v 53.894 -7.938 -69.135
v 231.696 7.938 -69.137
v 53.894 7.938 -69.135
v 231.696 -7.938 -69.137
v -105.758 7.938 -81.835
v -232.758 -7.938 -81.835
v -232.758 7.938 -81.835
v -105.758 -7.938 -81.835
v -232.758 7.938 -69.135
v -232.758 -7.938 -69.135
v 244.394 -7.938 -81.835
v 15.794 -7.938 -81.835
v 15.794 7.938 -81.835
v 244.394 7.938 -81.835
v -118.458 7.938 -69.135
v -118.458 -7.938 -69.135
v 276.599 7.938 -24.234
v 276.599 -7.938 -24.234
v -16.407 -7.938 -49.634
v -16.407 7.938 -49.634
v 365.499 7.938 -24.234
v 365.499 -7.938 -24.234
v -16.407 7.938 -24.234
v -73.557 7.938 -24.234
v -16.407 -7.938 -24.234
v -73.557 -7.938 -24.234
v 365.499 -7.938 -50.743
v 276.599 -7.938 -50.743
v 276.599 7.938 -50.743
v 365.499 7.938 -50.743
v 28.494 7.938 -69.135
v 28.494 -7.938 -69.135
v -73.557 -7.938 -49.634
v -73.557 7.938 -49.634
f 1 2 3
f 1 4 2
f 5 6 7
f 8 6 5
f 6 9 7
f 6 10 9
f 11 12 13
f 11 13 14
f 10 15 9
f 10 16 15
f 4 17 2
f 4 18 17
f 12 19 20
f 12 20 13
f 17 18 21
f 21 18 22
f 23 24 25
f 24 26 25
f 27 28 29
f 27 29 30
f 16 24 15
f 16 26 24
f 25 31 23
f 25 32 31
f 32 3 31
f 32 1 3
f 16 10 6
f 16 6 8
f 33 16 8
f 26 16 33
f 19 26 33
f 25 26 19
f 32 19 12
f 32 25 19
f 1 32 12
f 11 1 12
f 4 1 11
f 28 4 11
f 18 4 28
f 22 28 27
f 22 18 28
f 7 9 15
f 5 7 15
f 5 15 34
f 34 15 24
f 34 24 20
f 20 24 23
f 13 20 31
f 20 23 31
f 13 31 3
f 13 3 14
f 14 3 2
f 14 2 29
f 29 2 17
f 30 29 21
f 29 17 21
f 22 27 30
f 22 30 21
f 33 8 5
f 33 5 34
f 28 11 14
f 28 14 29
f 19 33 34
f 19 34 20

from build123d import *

# Parameters (mm, degrees)
F1_DEPTH = 7.9375
F2_DEPTH = 7.9375
F0_W     = 57.15
F0_H     = 25.4
F3_DEPTH = 7.9375
F4_DEPTH = 7.9375
F5_DEPTH = 7.9375
F6_DEPTH = 7.9375
F0_W_2   = 88.9
F0_H_2   = 26.509378
F7_DEPTH = 7.9375


with BuildPart() as f1:
    # F0 (on Front) → F1 (new body, symmetric)
    with BuildSketch(Plane.XZ):
        Polygon((-232.758469, -69.13498), (-232.758469, -81.83498), (-105.758469, -81.83498), (-118.458469, -69.13498), align=None)
    extrude(amount=F1_DEPTH, both=True)

    # F0 (on Front) → F2 (join, symmetric)
    with BuildSketch(Plane.XZ):
        Polygon((-118.458469, -69.13498), (-105.758469, -81.83498), (-73.557188, -49.6337), (-73.557188, -24.2337), align=None)
    extrude(amount=F2_DEPTH, both=True)

    # F0 (on Front) → F3 (join, symmetric)
    with BuildSketch(Plane.XZ):
        with Locations((-44.982188, -36.9337)):
            Rectangle(F0_W, F0_H)
    extrude(amount=F3_DEPTH, both=True)

    # F0 (on Front) → F4 (join, symmetric)
    with BuildSketch(Plane.XZ):
        Polygon((-16.407188, -24.2337), (-16.407188, -49.6337), (15.794092, -81.83498), (28.494092, -69.13498), align=None)
    extrude(amount=F4_DEPTH, both=True)

    # F0 (on Front) → F5 (join, symmetric)
    with BuildSketch(Plane.XZ):
        Polygon((28.494092, -69.13498), (15.794092, -81.83498), (53.894092, -81.83498), (244.394092, -81.83498), (231.69601, -69.136898), (53.894092, -69.13498), align=None)
    extrude(amount=F5_DEPTH, both=True)

    # F0 (on Front) → F6 (join, symmetric)
    with BuildSketch(Plane.XZ):
        Polygon((231.69601, -69.136898), (244.394092, -81.83498), (276.599208, -50.743078), (276.599208, -24.2337), align=None)
    extrude(amount=F6_DEPTH, both=True)

    # F0 (on Front) → F7 (join, symmetric)
    with BuildSketch(Plane.XZ):
        with Locations((321.049208, -37.488389)):
            Rectangle(F0_W_2, F0_H_2)
    extrude(amount=F7_DEPTH, both=True)


solid = f1.part
